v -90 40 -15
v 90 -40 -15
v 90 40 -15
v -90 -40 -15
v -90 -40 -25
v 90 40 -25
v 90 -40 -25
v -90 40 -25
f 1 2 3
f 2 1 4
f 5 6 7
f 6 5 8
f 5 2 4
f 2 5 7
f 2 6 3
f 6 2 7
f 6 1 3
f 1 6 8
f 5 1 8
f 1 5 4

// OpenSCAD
color("white")
	translate([0,0,-20])
		cube([180,80,10], center=true);
